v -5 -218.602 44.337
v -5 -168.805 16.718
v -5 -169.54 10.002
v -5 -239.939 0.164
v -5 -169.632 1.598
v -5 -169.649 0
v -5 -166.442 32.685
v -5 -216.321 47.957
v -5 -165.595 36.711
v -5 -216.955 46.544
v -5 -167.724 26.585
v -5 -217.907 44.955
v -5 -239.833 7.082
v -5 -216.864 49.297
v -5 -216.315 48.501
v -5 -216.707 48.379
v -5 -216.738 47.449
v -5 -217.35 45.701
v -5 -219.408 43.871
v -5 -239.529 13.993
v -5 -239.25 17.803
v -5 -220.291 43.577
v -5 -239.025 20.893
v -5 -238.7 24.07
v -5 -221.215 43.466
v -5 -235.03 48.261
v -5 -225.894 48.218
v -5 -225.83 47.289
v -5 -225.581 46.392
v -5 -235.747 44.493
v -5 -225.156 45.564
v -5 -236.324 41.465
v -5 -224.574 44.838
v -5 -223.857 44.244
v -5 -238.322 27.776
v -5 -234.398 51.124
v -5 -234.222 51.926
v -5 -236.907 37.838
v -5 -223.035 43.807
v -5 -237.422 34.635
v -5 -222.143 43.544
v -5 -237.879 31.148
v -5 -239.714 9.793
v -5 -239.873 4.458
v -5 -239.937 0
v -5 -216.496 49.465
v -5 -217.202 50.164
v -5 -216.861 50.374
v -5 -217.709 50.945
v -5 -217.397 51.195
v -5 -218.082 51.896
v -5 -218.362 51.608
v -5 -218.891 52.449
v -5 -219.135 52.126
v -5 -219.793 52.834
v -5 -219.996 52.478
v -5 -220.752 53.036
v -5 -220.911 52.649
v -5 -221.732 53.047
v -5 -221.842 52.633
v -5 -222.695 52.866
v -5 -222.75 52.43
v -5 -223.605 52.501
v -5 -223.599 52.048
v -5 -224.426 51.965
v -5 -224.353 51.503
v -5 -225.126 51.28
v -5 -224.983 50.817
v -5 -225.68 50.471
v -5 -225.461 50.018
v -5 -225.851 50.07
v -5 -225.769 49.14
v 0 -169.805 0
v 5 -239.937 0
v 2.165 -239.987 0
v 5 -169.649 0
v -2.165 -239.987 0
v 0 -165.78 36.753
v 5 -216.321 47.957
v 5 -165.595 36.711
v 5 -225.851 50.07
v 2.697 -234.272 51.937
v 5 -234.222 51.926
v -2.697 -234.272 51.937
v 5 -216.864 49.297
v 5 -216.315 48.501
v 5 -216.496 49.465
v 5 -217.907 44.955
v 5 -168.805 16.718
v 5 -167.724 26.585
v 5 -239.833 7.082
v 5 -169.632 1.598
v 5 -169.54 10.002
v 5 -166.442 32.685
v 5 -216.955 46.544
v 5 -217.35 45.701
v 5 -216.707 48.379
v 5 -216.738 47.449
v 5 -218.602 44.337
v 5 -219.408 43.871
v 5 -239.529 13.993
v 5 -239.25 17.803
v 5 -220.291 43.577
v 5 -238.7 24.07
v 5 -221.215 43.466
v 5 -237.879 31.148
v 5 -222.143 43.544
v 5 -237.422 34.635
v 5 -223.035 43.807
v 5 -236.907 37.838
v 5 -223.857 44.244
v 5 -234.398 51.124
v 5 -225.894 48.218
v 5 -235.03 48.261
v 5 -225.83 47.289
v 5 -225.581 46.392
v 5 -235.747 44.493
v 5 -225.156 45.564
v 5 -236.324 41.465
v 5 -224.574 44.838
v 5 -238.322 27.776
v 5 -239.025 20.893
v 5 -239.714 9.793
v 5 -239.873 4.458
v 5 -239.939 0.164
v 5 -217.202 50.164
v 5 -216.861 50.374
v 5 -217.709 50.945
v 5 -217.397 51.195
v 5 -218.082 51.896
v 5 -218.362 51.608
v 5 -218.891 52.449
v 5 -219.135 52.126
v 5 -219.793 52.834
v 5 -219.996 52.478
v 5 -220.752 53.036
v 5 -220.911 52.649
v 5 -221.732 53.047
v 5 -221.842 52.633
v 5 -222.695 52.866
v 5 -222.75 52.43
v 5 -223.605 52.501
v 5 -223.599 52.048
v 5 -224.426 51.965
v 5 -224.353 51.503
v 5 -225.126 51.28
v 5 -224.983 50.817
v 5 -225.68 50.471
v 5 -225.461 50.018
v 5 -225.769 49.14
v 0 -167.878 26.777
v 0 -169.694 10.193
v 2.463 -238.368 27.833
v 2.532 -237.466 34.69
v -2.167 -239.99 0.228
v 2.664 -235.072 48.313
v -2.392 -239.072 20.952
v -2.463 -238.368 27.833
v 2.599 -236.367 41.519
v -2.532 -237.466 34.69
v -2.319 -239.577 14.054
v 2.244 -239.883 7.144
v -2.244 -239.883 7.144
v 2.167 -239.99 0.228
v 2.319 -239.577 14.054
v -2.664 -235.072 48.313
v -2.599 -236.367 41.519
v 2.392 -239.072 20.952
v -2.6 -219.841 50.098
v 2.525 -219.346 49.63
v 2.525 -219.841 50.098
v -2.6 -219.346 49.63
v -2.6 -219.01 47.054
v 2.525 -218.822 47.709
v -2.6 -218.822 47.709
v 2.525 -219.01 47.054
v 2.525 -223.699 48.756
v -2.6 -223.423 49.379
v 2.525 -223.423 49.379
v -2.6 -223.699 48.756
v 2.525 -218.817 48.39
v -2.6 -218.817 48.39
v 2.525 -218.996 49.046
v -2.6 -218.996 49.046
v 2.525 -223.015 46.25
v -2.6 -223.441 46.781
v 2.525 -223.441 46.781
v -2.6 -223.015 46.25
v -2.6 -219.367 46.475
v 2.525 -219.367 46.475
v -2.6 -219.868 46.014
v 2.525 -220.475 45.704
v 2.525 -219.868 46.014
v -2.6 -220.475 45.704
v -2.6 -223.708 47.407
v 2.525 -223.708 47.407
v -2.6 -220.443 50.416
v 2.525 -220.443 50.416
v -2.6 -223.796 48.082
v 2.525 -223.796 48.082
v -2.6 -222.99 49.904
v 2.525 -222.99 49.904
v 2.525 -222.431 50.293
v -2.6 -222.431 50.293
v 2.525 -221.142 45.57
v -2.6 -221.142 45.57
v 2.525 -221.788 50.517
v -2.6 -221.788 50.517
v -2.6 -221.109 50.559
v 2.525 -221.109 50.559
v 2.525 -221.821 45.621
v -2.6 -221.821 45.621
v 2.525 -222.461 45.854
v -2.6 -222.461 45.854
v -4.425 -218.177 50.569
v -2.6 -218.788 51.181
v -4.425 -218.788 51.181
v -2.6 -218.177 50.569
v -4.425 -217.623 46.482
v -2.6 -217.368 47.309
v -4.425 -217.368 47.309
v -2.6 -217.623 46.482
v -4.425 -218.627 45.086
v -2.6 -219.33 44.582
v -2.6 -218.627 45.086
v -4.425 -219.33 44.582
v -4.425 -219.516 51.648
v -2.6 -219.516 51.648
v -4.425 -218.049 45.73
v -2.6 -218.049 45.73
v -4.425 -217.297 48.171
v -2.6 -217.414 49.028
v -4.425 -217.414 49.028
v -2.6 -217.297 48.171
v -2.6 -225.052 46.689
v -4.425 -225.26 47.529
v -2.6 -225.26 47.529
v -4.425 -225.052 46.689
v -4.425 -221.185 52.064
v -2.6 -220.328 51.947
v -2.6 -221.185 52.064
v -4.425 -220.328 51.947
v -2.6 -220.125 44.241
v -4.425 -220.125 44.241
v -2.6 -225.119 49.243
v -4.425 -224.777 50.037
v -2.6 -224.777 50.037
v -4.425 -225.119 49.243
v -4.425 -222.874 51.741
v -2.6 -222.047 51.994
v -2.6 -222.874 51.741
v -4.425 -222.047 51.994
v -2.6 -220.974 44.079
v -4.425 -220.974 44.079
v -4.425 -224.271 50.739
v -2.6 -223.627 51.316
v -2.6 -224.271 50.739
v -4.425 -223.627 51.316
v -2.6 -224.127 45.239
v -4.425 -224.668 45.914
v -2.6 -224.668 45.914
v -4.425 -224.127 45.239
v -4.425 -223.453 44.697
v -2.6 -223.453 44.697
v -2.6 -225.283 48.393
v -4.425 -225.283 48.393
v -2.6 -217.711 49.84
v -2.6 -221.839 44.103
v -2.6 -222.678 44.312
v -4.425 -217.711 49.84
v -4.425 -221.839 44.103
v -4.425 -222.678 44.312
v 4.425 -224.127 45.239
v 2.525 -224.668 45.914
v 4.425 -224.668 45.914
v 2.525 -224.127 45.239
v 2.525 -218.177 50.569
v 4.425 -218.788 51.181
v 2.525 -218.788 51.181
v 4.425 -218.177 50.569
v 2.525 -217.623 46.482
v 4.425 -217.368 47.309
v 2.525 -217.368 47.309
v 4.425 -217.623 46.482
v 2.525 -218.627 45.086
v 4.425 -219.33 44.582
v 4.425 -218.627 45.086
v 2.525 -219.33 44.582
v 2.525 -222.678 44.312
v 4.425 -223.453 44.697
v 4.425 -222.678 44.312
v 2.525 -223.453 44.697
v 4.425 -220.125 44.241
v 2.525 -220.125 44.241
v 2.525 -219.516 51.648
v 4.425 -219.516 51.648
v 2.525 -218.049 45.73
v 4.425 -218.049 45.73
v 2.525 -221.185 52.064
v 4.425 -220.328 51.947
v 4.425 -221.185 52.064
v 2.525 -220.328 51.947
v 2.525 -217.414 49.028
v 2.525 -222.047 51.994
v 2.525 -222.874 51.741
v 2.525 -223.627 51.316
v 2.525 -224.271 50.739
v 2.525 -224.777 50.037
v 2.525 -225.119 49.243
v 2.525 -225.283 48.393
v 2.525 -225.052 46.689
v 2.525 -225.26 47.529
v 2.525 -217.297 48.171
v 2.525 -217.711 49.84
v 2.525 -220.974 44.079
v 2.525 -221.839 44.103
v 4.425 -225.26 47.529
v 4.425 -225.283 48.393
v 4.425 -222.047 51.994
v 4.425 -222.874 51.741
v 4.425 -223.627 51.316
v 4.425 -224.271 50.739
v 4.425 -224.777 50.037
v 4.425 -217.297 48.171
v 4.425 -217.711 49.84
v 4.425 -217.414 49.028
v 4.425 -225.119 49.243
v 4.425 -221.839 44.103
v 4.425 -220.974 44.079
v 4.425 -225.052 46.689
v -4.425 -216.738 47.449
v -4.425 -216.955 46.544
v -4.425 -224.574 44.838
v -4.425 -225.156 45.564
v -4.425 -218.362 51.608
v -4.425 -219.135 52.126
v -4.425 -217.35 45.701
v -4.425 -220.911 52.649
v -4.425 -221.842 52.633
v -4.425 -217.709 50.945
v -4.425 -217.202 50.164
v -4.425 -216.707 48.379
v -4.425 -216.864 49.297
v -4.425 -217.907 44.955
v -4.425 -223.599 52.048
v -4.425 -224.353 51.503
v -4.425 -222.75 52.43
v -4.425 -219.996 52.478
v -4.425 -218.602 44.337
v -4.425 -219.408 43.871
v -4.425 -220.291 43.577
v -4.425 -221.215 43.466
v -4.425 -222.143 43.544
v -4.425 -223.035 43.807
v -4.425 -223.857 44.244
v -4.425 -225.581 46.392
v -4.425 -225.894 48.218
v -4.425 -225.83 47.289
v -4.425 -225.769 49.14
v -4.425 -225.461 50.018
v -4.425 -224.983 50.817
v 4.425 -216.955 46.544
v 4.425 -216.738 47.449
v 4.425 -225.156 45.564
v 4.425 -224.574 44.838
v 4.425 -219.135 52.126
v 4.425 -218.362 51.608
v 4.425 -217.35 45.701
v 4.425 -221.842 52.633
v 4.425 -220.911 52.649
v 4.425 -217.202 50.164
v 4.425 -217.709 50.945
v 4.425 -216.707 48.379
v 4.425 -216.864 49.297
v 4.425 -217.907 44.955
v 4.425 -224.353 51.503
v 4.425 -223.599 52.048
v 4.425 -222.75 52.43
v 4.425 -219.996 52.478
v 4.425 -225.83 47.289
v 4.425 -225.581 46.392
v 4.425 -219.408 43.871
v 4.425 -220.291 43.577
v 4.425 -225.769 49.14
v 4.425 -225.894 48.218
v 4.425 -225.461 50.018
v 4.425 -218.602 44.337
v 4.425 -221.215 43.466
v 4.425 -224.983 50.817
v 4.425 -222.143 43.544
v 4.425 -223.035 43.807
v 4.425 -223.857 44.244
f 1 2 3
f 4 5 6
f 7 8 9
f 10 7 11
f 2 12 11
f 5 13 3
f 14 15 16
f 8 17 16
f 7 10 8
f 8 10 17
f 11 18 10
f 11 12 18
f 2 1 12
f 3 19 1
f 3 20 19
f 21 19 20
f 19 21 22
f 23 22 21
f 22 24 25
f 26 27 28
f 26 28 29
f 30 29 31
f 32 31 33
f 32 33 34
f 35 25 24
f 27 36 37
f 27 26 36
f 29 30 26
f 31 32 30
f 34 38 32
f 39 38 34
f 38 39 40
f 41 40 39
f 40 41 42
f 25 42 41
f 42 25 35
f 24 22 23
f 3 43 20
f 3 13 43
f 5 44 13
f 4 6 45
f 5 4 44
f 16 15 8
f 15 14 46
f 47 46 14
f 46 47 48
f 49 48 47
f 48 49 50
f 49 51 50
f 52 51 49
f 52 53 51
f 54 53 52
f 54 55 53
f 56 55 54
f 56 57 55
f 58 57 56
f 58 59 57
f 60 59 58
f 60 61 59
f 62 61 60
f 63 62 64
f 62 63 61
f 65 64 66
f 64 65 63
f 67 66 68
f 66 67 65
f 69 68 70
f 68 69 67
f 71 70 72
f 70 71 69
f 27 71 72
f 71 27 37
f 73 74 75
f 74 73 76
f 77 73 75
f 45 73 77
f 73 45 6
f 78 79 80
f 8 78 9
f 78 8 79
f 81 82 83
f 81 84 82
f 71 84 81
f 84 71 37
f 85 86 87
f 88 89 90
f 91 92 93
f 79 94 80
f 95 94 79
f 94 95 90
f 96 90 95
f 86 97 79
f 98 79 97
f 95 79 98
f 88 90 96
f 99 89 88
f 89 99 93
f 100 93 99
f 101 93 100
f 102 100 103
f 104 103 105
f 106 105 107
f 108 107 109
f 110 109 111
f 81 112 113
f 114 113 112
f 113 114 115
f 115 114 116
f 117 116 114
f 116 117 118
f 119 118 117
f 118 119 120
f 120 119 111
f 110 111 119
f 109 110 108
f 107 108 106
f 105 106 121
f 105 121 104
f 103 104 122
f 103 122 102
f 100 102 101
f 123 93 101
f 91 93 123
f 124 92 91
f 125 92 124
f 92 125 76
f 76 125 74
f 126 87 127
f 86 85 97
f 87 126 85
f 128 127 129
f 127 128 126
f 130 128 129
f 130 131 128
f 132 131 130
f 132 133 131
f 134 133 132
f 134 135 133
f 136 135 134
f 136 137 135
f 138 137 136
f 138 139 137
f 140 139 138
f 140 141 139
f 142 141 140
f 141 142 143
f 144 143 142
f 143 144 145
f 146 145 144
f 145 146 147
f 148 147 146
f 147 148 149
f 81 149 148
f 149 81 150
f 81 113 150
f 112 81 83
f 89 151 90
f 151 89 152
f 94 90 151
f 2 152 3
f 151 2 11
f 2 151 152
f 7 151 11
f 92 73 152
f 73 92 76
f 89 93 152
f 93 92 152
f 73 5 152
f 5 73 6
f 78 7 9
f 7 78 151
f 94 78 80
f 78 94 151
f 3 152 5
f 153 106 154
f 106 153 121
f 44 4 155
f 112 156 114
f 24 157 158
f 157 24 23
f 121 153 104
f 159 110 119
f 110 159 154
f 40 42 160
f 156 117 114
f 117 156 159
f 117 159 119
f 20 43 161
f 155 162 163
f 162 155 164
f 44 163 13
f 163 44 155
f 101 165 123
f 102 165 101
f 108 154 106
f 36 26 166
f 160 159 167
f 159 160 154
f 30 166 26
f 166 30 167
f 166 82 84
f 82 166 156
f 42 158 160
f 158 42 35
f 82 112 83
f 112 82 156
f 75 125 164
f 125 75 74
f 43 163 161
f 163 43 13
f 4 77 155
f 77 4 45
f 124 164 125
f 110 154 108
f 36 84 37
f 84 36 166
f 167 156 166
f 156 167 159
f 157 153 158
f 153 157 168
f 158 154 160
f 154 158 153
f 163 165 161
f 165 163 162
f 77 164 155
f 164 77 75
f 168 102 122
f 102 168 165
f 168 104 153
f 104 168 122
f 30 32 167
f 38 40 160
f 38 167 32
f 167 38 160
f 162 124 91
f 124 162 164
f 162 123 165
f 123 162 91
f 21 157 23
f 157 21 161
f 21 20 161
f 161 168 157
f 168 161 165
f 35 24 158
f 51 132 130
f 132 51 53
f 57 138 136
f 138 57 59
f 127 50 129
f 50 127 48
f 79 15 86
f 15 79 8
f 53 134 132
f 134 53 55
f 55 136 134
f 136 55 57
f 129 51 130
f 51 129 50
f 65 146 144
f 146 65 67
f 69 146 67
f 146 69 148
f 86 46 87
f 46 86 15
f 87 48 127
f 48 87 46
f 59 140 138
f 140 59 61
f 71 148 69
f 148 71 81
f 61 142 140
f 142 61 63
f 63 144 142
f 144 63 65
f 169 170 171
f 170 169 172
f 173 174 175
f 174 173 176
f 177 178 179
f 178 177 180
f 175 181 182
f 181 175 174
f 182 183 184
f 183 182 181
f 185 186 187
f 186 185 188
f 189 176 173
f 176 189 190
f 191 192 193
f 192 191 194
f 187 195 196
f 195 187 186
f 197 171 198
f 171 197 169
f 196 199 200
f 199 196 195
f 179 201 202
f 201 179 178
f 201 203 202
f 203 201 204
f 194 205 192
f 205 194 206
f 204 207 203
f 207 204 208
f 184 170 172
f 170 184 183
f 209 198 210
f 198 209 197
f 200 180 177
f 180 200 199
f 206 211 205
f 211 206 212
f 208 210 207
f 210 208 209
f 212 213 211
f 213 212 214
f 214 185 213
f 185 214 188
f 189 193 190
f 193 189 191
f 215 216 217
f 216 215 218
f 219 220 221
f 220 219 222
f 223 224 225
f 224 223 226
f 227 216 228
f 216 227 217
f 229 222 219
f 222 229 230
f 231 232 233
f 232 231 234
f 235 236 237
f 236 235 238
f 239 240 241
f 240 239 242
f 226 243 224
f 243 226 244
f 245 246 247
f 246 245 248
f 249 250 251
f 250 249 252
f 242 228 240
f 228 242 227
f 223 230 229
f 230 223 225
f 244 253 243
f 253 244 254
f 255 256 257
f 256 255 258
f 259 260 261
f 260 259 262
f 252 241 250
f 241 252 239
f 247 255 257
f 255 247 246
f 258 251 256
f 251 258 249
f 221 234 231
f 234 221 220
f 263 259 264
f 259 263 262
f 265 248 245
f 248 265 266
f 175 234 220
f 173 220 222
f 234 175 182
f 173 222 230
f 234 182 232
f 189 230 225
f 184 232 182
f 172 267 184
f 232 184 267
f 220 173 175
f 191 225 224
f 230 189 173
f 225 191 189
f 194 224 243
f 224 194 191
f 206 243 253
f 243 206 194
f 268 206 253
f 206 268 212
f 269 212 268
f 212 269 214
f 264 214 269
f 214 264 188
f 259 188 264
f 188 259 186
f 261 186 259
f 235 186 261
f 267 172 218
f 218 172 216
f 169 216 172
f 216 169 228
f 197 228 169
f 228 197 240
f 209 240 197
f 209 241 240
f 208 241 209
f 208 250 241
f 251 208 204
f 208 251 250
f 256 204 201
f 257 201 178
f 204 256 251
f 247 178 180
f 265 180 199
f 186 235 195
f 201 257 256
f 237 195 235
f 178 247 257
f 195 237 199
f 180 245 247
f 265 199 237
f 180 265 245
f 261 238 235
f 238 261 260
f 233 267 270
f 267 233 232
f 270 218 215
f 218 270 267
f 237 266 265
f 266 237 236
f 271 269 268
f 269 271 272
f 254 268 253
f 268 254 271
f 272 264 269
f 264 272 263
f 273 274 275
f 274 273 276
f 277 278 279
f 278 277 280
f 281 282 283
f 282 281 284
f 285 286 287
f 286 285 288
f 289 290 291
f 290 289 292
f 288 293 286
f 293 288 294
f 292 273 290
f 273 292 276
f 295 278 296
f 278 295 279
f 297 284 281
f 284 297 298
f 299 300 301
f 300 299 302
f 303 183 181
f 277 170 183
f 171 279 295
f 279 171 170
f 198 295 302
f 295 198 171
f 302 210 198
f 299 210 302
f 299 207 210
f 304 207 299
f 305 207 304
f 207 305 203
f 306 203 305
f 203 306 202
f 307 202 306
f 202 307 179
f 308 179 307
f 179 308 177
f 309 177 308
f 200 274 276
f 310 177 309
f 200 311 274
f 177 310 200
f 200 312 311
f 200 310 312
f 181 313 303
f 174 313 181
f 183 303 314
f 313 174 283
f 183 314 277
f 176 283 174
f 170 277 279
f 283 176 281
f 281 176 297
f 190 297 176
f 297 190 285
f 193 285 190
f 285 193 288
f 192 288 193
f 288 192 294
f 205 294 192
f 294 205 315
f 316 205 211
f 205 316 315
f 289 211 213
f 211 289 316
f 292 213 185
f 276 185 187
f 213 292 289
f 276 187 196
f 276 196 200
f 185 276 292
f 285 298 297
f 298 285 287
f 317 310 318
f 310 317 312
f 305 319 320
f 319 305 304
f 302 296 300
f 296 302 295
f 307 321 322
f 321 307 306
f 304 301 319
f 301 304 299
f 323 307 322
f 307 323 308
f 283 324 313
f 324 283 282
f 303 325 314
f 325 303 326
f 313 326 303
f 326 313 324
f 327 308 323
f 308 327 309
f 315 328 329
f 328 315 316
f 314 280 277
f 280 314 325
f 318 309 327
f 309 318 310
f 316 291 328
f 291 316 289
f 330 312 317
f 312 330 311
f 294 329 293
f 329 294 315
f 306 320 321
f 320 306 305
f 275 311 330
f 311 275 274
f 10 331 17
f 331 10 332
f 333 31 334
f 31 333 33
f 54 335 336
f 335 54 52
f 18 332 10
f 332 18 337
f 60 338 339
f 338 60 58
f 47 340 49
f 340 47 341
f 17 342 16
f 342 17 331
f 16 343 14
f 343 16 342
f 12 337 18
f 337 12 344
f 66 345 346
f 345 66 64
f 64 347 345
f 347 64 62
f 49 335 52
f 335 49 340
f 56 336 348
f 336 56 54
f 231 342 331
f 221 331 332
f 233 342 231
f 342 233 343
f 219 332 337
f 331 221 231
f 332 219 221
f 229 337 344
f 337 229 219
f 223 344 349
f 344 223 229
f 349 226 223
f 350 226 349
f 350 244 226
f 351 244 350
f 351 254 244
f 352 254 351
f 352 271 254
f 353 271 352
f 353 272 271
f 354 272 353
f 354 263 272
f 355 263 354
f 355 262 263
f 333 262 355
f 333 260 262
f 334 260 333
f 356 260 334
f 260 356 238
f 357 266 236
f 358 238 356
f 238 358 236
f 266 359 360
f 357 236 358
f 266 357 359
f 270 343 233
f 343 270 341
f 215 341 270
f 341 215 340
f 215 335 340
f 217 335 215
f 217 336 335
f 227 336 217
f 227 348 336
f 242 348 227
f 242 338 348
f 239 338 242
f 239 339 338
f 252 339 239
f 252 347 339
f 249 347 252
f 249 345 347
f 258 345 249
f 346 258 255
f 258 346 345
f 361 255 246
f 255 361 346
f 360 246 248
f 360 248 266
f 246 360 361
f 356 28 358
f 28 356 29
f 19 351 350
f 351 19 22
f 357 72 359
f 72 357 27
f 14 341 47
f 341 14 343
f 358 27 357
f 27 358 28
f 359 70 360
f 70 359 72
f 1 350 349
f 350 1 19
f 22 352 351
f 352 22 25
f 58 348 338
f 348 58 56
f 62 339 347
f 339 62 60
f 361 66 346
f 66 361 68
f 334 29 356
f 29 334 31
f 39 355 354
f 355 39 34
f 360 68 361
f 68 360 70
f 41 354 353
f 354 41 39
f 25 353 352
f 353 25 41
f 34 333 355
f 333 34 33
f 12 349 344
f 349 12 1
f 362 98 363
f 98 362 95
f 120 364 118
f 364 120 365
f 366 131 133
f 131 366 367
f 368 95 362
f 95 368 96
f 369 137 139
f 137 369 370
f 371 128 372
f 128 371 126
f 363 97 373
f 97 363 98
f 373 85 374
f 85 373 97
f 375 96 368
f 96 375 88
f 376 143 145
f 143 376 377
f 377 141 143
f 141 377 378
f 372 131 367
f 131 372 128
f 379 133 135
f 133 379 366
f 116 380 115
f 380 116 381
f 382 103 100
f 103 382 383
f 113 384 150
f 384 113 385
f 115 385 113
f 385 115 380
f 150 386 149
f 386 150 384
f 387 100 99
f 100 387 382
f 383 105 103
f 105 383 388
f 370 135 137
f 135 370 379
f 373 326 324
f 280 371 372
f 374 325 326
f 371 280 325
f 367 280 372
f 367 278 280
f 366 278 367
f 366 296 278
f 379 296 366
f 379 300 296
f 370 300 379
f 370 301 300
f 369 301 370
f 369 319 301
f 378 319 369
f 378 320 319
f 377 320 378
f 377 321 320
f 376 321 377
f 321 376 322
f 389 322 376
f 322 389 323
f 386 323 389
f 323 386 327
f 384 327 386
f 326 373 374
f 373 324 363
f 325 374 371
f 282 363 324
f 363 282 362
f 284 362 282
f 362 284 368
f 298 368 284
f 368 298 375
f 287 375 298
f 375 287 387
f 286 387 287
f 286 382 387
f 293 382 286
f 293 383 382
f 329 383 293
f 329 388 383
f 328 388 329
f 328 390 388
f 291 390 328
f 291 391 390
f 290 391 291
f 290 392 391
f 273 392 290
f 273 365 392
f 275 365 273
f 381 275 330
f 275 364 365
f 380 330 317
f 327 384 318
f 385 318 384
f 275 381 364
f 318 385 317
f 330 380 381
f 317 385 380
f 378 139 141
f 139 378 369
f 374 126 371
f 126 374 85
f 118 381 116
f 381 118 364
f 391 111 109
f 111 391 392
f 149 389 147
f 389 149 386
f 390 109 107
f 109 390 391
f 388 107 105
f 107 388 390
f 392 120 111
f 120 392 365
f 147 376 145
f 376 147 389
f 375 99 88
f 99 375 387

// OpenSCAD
// file: ../motors/MN5212.scad
use <../utils.scad>

module MN5212(){

	//render(){
		difference(){
			union(){
				translate([0,0, 42.5 / 2 - 23 / 2 - 4.9 - 6])
					cylinder(
						h = 23,
						r = 59 / 2,
						$fa = fa(59 / 2),
						center = true);
				translate([0,0, 42.5 / 2 - 4.9 / 2 - 6])
					cylinder(
						h = 4.9,
						r1 = 59 / 2,
						r2 = 24.8 / 2,
						$fa = fa(59 / 2),
						center = true);
				translate([0,0, - 42.5 / 2 + 5.6 / 2 + 3])
					cylinder(
						h = 5.6,
						r1 = 44 / 2,
						r2 = 59 / 2,
						$fa = fa(59 / 2),
						center = true);
				translate([0, 0, 42.5 / 2 - 3])
					cylinder(
						h = 6,
						r = 4 / 2,
						$fa = fa(4 / 2),
						center = true);
				translate([0, 0, - 42.5 / 2 + 1.5])
					cylinder(
						h = 3,
						r = 6 / 2,
						$fa = fa(6 / 2),
						center = true);
			}
			union(){
				for(i = [0:90:270])
					rotate([0, 0, i])
						translate([0, 25 / 2, -16.25 - 0.025])
							cylinder(
								h = 4,
								r = 3 / 2,
								$fa = fa(3 / 2),
								center = true);
				for(i = [0:120:240])
					rotate([0, 0, i])
						translate([0, 17 / 2, 12.75 + 0.025])
							cylinder(
								h = 5,
								r = 3 / 2,
								$fa = fa(3 / 2),
								center = true);
				rotate([0, 0, 30])
					translate([0, 12 / 2, 12.75 + 0.025])
						cylinder(
							h = 5,
							r = 3 / 2,
							$fa = fa(3 / 2),
							center = true);
				rotate([0, 0, 30 + 180])
					translate([0, 12 / 2, 12.75 + 0.025])
						cylinder(
							h = 5,
							r = 3 / 2,
							$fa = fa(3 / 2),
							center = true);
			}
		}

	//}

}

MN5212();
// file: ../servos/TGY_4805_2PA.scad
use <../utils.scad>

module TGY_4805_2PA(){

	length = 40;
	width = 20;
	depth = 36.4;
	wing_width = 58;
	wing_thick = 2.45;
	wing_height = 27.7;
	shaft_offset = 9.5;
	hole_seperation = 9.2;
	hole_spacing = 50;
	shaft_height = 40;
	shaft_length = 3.6;
	hole_diameter = 4.8;

	module mounting_hole(){
		mh_rad = hole_diameter / 2;
		translate(
			[
				hole_spacing / 2,
				0,
				-depth / 2 + wing_height - wing_thick / 2
			])
			cylinder(h = 5, r = mh_rad, $fa = fa(mh_rad), center = true);
	}

	difference(){
		union(){
			cube([length, width, depth], center = true);
			translate([0, 0, -depth / 2 + wing_height - wing_thick / 2])
				cube([wing_width, width, wing_thick], center = true);
			translate(
				[
					- length / 2 + shaft_offset,
					0,
					shaft_height - length / 2 + shaft_length / 2
				])
				cylinder(
					h = shaft_length,
					r = 1.5,
					$fa = fa(1.5),
					center = true);
		}	union(){

			translate([0, hole_seperation / 2, 0]){
				mounting_hole();
				mirror() mounting_hole();
			}
			translate([0, -hole_seperation / 2, 0]){
				mounting_hole();
				mirror() mounting_hole();
			}
		}
	}
}

module TGY_4805_2PA_translate(){
	length = 40;
	shaft_offset = 9.5;
	shaft_height = 40;
	shaft_length = 3.6;
	translate(
		[
				- length / 2 + shaft_offset,
				0,
				shaft_height - length / 2 + shaft_length / 2
		]) children();
}

TGY_4805_2PA();
// file: ../servos/HS_5065MG.scad
use <../utils.scad>

module HS_5065MG(){

	length = 23.75;
	width = 11.68;
	depth = 20.32;
	wing_width = 32.38;
	wing_thick = 2;
	wing_offset = 1;
	shaft_offset = 6;
	hole_spacing = 28.32;
	hole_spacing_2 = 27;
	hole_2_wide = 6;
	hole_diameter = 2;
	shaft_height = 26.16;
	shaft_length = 2;

	module mounting_hole(){
		mh_rad = hole_diameter / 2;
		translate(
			[
				hole_spacing / 2,
				0,
				depth / 2 - wing_thick / 2
			])
			cylinder(h = 5, r = mh_rad, $fa = fa(mh_rad), center = true);
		translate(
			[
				hole_spacing_2 / 2,
				hole_2_wide / 2,
				depth / 2 - wing_thick / 2
			])
			cylinder(h = 5, r = mh_rad, $fa = fa(mh_rad), center = true);
		translate(
			[
				hole_spacing_2 / 2,
				- hole_2_wide / 2,
				depth / 2 - wing_thick / 2
			])
			cylinder(h = 5, r = mh_rad, $fa = fa(mh_rad), center = true);
	}

	difference(){
		union(){
			cube([length, width, depth], center = true);
			translate([0, 0, depth / 2 - wing_thick / 2 - wing_offset])
				cube([wing_width, width, wing_thick], center = true);
			translate(
				[
					- length / 2 + shaft_offset,
					0,
					depth / 2 + 3.8 + 1.9 + shaft_length / 2
				])
				cylinder(
					h = shaft_length,
					r = 1.5,
					$fa = fa(1.5),
					center = true);
			translate(
				[
					- length / 2 + shaft_offset,
					0,
					depth / 2 + 3.8 / 2
				])
				cylinder(
					h = 3.8,
					r = 11.3 / 2,
					$fa = fa(11.3 / 2),
					center = true);
			translate(
				[
					- length / 2 + shaft_offset,
					0,
					depth / 2 + 3.8 + 1.9 / 2
				])
				cylinder(
					h = 1.9,
					r1 = 11.3 / 2,
					r2 = 8 / 2,
					$fa = fa(11.3 / 2),
					center = true);
		}	union(){

			mounting_hole();
			mirror() mounting_hole();
		}
	}
}

module HS_5065MG_arm(){

	hole_size = 1.5;
	hole_spacing = 3;
	hole_offset = 9.6;

	difference(){
		union(){
			translate([0, 0, 4.4 / 2])
				cylinder(
					h = 4.4,
					r = 8 / 2,
					$fa = fa(8 / 2),
					center = true);
			hull(){
				translate([0, 0, 4.4 - 1.8 / 2])
					cylinder(
						h = 1.8,
						r = 8 / 2,
						$fa = fa(8 / 2),
						center = true);
				translate([18.8, 0, 4.4 - 1.8 / 2])
					cylinder(
						h = 1.8,
						r = 5 / 2,
						$fa = fa(5 / 2),
						center = true);
			}
		}
		union(){
			for(i = [0:3]){
				translate([hole_offset + hole_spacing * i, 0, 4.4 - 1.8 / 2])
					cylinder(
						h = 5,
						r = hole_size / 2,
						$fa = fa(hole_size / 2),
						center = true);
			}
		}
	}
}

module HS_5065MG_shaft_translate(){
	translate(
		[
			- 23.75 / 2 + 6,
			0,
			20.32 / 2 + 3.8 + 1.9
		])
			children();
}

HS_5065MG();
HS_5065MG_shaft_translate() HS_5065MG_arm();
// file: ../servos/LS_0006_servo.scad
// Author Michael Marques (DrYerzinia)

use <../utils.scad>

module ls_0006_servo(){
	
	length = 21.4;
	depth = 19.9;
	thickness = 11.65;

	gear_height = 2.6;
	gear_bump_height = 0.7;
	gear_bump_diameter = 1.97;
	gear_outer_bump_diameter = 6;
	gear_bump_offset = 12.2;

	shaft_height = 2.4;
	shaft_diameter = 3.74;
	shaft_offset = thickness / 2;
	shaft_screw_diameter = 1.3;
	
	wing_outer_width = 8.5;
	wing_top_off = 3.8;
	wing_length = 3.8;
	wing_thickness = 1.2;
	wing_hole_diameter = 1.85;
	wing_hole_edge_dist = 2;

	module wing_hole(){
		translate(
			[
				length / 2 + wing_hole_edge_dist,
				0,
				depth/2 - wing_top_off - wing_thickness / 2
			])
			cylinder(
				h = wing_thickness + 1,
				r = wing_hole_diameter / 2,
				$fn = 16,
				center = true);
	}

	module wing(){
		translate(
			[
				length / 2,
				thickness / 2,
				depth/2 - wing_top_off - wing_thickness
			])
			rotate([0,0,-90])
				trapezoid(
					thickness,
					wing_outer_width,
					wing_length,
					wing_thickness);
	}

	// Body
	cube([length, thickness, depth], center = true);

	difference(){
		union(){

			wing();
			mirror() wing();

			// Gear Bumps
			translate([0, 0, depth/2 + gear_height / 2]){
				translate([length / 2 - gear_bump_offset, 0, 0])
					cylinder(
						h = gear_height,
						r = gear_outer_bump_diameter / 2,
						$fn = 16,
						center = true);
				translate([length / 2 - gear_bump_offset, 0, gear_height/2 + gear_bump_height / 2])
					cylinder(
						h = gear_bump_height,
						r = gear_bump_diameter / 2,
						$fn = 16,
						center = true);
				translate([length / 2 - shaft_offset, 0, 0])
					cylinder(
						h = gear_height,
						r = thickness / 2,
						$fn = 32,
						center = true);
				// Shaft
				translate([length / 2 - shaft_offset, 0, gear_height])
					cylinder(
						h = shaft_height,
						r = shaft_diameter / 2,
						$fn = 16,
						center = true);
			}

		}
		union(){

			wing_hole();
			mirror() wing_hole();

			// Shaft_hole
			translate(
				[
					length / 2 - shaft_offset,
					0,
					depth/2 + gear_height * (3 / 2) + 0.5])
				cylinder(
					h = shaft_height + 1,
					r = shaft_screw_diameter / 2,
					$fn = 16,
					center = true);

		}
	}

}

module translate_ls_0006_attachment(){

	length = 21.4;
	thickness = 11.65;
	shaft_offset = thickness / 2;
	depth = 19.9;
	float = 3.3;

	translate([length / 2 - shaft_offset, 0, depth / 2 + float])
		children();

}

module bar_attachment(){

	height = 3.75;
	bar_length = 14.7;
	bar_thickness = 1.6;
	inner_radius = 5.9;
	outer_radius = 3.95;
	shaft_diameter = 3.7;
	upper_void_diameter = 4.8;
	screw_diameter = 2;
	hole_spacing = 2;
	hole_4_diameter = 1.2;
	hole_diameter = 1;
	hole_start_off = 4.7;
	top_void_depth = 0.67;
	bottom_void_depth = 1.84;

	translate([0, 0, height / 2]){
		difference(){
			union(){

				translate([0, inner_radius / 2, height / 2 - bar_thickness])
					rotate([0,0,-90])
						trapezoid(
							inner_radius,
							outer_radius,
							bar_length,
							bar_thickness);

				cylinder(
					h = height,
					r = inner_radius / 2,
					$fn = 16,
					center = true);

				translate([bar_length, 0, height / 2 - bar_thickness / 2])
					cylinder(
						h = bar_thickness,
						r = outer_radius / 2,
						$fn = 16,
						center = true);

			}
			union(){
				// screwhole
				cylinder(
					h = height + 1,
					r = screw_diameter / 2,
					$fn = 16,
					center = true);
				// voids
				translate([0, 0, height / 2 - top_void_depth / 2 + 0.5])
					cylinder(
						h = top_void_depth + 1,
						r = upper_void_diameter / 2,
						$fn = 16,
						center = true);
				translate([0, 0,  - bottom_void_depth / 2 - 0.5])
					cylinder(
						h = bottom_void_depth + 1,
						r = shaft_diameter / 2,
						$fn = 16,
						center = true);

				for(i = [0:4]){
					dia = (i != 3) ? hole_diameter : hole_4_diameter;
					translate(
						[
							hole_start_off + hole_spacing * i,
							0,
							height / 2 - bar_thickness / 2])
						cylinder(
							h = bar_thickness + 1,
							r = dia / 2,
							$fn = 16,
							center = true);
				}

			}
		}
	}

}

ls_0006_servo();
translate_ls_0006_attachment() bar_attachment();
// file: ../servos/parallax_continuous_rotation_servo.scad
// Author Michael Marques (DrYerzinia)

module parallax_continuous_rotation_servo(){

	depth = 37.7;
	length = 40.75;
	width = 19.75;

	mount_height = 2.7;
	mount_extent = 6.1;
	mount_from_top = 7.7;

	mount_hole_diameter = 4.46;
	mount_hole_spacing = 14.4 - mount_hole_diameter;

	shaft_diameter = 5.8;
	shaft_offset = 10;
	shaft_length = 3.5;

	module mounting_hole(){

			translate(
				[
					length / 2 + 5,
					mount_hole_spacing / 2,
					depth / 2 - mount_height / 2 - mount_from_top
				]
				)
				cylinder(
					h = mount_height + 1,
					r = mount_hole_diameter / 2,
					$fn=16,
					center = true);
	}

	difference(){
		union(){

			// Body
			cube([length,width,depth], center = true);

			// Mounting wings
			translate(
				[
					0,
					0,
					depth / 2 - mount_height / 2 - mount_from_top
				])
				cube(
					[
						length + mount_extent * 2,
						width,
						mount_height
					],
					center = true);

			// Shaft
			translate(
				[
					length / 2 - shaft_offset,
					0,
					depth / 2 + shaft_length / 2
				]
				)
				cylinder(
					h = shaft_length,
					r = shaft_diameter / 2,
					$fn = 16,
					center = true
				);

		}
		union(){

			// Mounting Holes
			mounting_hole();
			mirror()
				mounting_hole();

			translate([0,-mount_hole_spacing,0]){
				mounting_hole();
				mirror()
					mounting_hole();
			}
		}
	}

}

module translate_shaft(){

	depth = 37.7;
	length = 40.75;

	shaft_offset = 10;

	translate(
		[
			length / 2 - shaft_offset,
			0,
			depth / 2
		])
		children();
}

module round_servo_attachment(){

	height = 6;
	diameter = 20.8;
	inner_diameter = 8.6;
	plate_thickness = 2.45;

	float = 2;

	depth = 37.7;
	length = 40.75;

	shaft_offset = 10;

	plate_hole_spacing = 14.5;
	plate_hole_diameter = 1.4;
	plate_hole_minor_spacing = 3.5;

	screw_hole_diameter = 3;

	inner_diameter = 8;
	
	top_depth = 1.8;
	bottom_depth = 3.4;

	void_diameter = 5.8;

	module plate_hole(){
		cylinder(
			h = plate_thickness + 1,
			r = plate_hole_diameter / 2,
			$fn = 16,
			center = true
		);
	}

	module plate_hole_group(){
		translate([0, 0, height / 2 - plate_thickness / 2]){
			translate([0, plate_hole_spacing / 2, 0]){
					plate_hole();
					translate([- plate_hole_minor_spacing, 0, 0])
						plate_hole();
					translate([  plate_hole_minor_spacing, 0, 0])
						plate_hole();
			}
		}
	}

	translate(
		[
			length / 2 - shaft_offset,
			0,
			depth / 2 + height / 2 + float
		]
		)
		difference(){

			union(){

				// inner shaft
				cylinder(
					h = height,
					r = inner_diameter / 2,
					$fn = 16,
					center = true
				);

				// top
				translate([0, 0, height / 2 - plate_thickness / 2])
					cylinder(
						h = plate_thickness,
						r = diameter / 2,
						$fn = 32,
						center = true
					);
			}

			union(){

				// plate holes
				for(ang = [0:3]){
					rotate([0,0, ang * 90])
						plate_hole_group();
				}

				// screw hole
				cylinder(
					h = height + 1,
					r = screw_hole_diameter / 2,
					$fn = 16,
					center = true
				);

				// inner voids
				translate([0, 0, height / 2 - top_depth / 2 + 1])
					cylinder(
						h = top_depth + 1,
						r = void_diameter / 2,
						$fn = 16,
						center = true
					);
				translate([0, 0, -1])
					cylinder(
						h = bottom_depth + 1,
						r = void_diameter / 2,
						$fn = 16,
						center = true
					);

			}

		}

}

parallax_continuous_rotation_servo();
round_servo_attachment();
// file: ../hardware.scad
 // Author Michael Marques (DrYerzinia)

// http://www.ebay.com/itm/10-PCS-683-3x7x2-mm-Metal-OPEN-PRECISION-Miniature-Ball-Bearing-3-7-2-/291206307942?hash=item43cd3fa066:m:mCi6eovrGVk_CjIUjlhw8yg
// E-Bay empire.rc

module washer_M3_7x3_2x0_5mm(){

	difference(){
		cylinder(
			h = 0.5,
			r = 7 / 2,
			$fn = 16,
			center = true);
		cylinder(
			h = 0.5 + 0.1,
			r = 3.2 / 2,
			$fn = 16,
			center = true);
	}

}

module bearing_3x7x2mm(){

	difference(){
		cylinder(
			h = 2,
			r = 7 / 2,
			$fn = 16,
			center = true);
		cylinder(
			h = 2 + 1,
			r = 3 / 2,
			$fn = 16,
			center = true);
	}

}

module bearing_5x8x2_5mm(){

	difference(){
		cylinder(
			h = 2.5,
			r = 8 / 2,
			$fn = 16,
			center = true);
		cylinder(
			h = 2.5 + 1,
			r = 5 / 2,
			$fn = 16,
			center = true);
	}

}

module bearing_8x16x5mm(){

	difference(){
		cylinder(
			h = 5,
			r = 16 / 2,
			$fn = 16,
			center = true);
		cylinder(
			h = 5 + 1,
			r = 8 / 2,
			$fn = 16,
			center = true);
	}

}


bearing_5x8x2_5mm();
// file: ../utils.scad
// http://forum.openscad.org/Creating-pie-pizza-slice-shape-need-a-dynamic-length-array-td3148.html

module pie_slice(r, start_angle, end_angle) {
    R = r * sqrt(2) + 1;
    a0 = (4 * start_angle + 0 * end_angle) / 4;
    a1 = (3 * start_angle + 1 * end_angle) / 4;
    a2 = (2 * start_angle + 2 * end_angle) / 4;
    a3 = (1 * start_angle + 3 * end_angle) / 4;
    a4 = (0 * start_angle + 4 * end_angle) / 4;
    if(end_angle > start_angle)
        intersection() {
        circle(r, $fa = fa(r));
        polygon([
            [0,0],
            [R * cos(a0), R * sin(a0)],
            [R * cos(a1), R * sin(a1)],
            [R * cos(a2), R * sin(a2)],
            [R * cos(a3), R * sin(a3)],
            [R * cos(a4), R * sin(a4)],
            [0,0]
       ]);
    }
}

// https://github.com/openscad/openscad/issues/29

module rotate_about(v,a) {
	translate(v) rotate(a) translate(-v) children();
}

module rotate_about_axis(v, ang, axis) {
	translate(v) rotate(ang, axis) translate(-v) children();
}

// https://github.com/robofun/openscad-utils/blob/master/trapezoid.scad

module trapezoid(width_base, width_top, height, thickness){
	

  linear_extrude(height = thickness)
		polygon(
			points =
				[
					[0,0],
					[width_base,0],
					[width_base-(width_base-width_top)/2,height],
					[(width_base-width_top)/2,height]
				],
				paths=[[0,1,2,3]]); 
  
}

// http://forum.openscad.org/fe-Tolerance-based-arc-approximation-td14212.html

function fa(r)=($fn>0)?360/$fn:($fe>0)?($fe<r)?min(45,2*acos(1-$fe/r)):45:$fa; 
// file: ../render_settings.scad
// Author Michael Marques (DrYerzinia)

// Lulzbot Mini tolerances
// x/y 0.1mm
// z   0.05mm
//
// 0.1mm   preview tolerance
// 0.025mm export  tolerance

$fs = 0.01;
$fn = undef;
$fa = 360 / 5;

$fe = 0.025;	// export
// main file
// Author Michael Marques (DrYerzinia)

include <../render_settings.scad>

use <../BB8.scad>

rotate([38.75 + 90, 0, 0])
Body_P12();
